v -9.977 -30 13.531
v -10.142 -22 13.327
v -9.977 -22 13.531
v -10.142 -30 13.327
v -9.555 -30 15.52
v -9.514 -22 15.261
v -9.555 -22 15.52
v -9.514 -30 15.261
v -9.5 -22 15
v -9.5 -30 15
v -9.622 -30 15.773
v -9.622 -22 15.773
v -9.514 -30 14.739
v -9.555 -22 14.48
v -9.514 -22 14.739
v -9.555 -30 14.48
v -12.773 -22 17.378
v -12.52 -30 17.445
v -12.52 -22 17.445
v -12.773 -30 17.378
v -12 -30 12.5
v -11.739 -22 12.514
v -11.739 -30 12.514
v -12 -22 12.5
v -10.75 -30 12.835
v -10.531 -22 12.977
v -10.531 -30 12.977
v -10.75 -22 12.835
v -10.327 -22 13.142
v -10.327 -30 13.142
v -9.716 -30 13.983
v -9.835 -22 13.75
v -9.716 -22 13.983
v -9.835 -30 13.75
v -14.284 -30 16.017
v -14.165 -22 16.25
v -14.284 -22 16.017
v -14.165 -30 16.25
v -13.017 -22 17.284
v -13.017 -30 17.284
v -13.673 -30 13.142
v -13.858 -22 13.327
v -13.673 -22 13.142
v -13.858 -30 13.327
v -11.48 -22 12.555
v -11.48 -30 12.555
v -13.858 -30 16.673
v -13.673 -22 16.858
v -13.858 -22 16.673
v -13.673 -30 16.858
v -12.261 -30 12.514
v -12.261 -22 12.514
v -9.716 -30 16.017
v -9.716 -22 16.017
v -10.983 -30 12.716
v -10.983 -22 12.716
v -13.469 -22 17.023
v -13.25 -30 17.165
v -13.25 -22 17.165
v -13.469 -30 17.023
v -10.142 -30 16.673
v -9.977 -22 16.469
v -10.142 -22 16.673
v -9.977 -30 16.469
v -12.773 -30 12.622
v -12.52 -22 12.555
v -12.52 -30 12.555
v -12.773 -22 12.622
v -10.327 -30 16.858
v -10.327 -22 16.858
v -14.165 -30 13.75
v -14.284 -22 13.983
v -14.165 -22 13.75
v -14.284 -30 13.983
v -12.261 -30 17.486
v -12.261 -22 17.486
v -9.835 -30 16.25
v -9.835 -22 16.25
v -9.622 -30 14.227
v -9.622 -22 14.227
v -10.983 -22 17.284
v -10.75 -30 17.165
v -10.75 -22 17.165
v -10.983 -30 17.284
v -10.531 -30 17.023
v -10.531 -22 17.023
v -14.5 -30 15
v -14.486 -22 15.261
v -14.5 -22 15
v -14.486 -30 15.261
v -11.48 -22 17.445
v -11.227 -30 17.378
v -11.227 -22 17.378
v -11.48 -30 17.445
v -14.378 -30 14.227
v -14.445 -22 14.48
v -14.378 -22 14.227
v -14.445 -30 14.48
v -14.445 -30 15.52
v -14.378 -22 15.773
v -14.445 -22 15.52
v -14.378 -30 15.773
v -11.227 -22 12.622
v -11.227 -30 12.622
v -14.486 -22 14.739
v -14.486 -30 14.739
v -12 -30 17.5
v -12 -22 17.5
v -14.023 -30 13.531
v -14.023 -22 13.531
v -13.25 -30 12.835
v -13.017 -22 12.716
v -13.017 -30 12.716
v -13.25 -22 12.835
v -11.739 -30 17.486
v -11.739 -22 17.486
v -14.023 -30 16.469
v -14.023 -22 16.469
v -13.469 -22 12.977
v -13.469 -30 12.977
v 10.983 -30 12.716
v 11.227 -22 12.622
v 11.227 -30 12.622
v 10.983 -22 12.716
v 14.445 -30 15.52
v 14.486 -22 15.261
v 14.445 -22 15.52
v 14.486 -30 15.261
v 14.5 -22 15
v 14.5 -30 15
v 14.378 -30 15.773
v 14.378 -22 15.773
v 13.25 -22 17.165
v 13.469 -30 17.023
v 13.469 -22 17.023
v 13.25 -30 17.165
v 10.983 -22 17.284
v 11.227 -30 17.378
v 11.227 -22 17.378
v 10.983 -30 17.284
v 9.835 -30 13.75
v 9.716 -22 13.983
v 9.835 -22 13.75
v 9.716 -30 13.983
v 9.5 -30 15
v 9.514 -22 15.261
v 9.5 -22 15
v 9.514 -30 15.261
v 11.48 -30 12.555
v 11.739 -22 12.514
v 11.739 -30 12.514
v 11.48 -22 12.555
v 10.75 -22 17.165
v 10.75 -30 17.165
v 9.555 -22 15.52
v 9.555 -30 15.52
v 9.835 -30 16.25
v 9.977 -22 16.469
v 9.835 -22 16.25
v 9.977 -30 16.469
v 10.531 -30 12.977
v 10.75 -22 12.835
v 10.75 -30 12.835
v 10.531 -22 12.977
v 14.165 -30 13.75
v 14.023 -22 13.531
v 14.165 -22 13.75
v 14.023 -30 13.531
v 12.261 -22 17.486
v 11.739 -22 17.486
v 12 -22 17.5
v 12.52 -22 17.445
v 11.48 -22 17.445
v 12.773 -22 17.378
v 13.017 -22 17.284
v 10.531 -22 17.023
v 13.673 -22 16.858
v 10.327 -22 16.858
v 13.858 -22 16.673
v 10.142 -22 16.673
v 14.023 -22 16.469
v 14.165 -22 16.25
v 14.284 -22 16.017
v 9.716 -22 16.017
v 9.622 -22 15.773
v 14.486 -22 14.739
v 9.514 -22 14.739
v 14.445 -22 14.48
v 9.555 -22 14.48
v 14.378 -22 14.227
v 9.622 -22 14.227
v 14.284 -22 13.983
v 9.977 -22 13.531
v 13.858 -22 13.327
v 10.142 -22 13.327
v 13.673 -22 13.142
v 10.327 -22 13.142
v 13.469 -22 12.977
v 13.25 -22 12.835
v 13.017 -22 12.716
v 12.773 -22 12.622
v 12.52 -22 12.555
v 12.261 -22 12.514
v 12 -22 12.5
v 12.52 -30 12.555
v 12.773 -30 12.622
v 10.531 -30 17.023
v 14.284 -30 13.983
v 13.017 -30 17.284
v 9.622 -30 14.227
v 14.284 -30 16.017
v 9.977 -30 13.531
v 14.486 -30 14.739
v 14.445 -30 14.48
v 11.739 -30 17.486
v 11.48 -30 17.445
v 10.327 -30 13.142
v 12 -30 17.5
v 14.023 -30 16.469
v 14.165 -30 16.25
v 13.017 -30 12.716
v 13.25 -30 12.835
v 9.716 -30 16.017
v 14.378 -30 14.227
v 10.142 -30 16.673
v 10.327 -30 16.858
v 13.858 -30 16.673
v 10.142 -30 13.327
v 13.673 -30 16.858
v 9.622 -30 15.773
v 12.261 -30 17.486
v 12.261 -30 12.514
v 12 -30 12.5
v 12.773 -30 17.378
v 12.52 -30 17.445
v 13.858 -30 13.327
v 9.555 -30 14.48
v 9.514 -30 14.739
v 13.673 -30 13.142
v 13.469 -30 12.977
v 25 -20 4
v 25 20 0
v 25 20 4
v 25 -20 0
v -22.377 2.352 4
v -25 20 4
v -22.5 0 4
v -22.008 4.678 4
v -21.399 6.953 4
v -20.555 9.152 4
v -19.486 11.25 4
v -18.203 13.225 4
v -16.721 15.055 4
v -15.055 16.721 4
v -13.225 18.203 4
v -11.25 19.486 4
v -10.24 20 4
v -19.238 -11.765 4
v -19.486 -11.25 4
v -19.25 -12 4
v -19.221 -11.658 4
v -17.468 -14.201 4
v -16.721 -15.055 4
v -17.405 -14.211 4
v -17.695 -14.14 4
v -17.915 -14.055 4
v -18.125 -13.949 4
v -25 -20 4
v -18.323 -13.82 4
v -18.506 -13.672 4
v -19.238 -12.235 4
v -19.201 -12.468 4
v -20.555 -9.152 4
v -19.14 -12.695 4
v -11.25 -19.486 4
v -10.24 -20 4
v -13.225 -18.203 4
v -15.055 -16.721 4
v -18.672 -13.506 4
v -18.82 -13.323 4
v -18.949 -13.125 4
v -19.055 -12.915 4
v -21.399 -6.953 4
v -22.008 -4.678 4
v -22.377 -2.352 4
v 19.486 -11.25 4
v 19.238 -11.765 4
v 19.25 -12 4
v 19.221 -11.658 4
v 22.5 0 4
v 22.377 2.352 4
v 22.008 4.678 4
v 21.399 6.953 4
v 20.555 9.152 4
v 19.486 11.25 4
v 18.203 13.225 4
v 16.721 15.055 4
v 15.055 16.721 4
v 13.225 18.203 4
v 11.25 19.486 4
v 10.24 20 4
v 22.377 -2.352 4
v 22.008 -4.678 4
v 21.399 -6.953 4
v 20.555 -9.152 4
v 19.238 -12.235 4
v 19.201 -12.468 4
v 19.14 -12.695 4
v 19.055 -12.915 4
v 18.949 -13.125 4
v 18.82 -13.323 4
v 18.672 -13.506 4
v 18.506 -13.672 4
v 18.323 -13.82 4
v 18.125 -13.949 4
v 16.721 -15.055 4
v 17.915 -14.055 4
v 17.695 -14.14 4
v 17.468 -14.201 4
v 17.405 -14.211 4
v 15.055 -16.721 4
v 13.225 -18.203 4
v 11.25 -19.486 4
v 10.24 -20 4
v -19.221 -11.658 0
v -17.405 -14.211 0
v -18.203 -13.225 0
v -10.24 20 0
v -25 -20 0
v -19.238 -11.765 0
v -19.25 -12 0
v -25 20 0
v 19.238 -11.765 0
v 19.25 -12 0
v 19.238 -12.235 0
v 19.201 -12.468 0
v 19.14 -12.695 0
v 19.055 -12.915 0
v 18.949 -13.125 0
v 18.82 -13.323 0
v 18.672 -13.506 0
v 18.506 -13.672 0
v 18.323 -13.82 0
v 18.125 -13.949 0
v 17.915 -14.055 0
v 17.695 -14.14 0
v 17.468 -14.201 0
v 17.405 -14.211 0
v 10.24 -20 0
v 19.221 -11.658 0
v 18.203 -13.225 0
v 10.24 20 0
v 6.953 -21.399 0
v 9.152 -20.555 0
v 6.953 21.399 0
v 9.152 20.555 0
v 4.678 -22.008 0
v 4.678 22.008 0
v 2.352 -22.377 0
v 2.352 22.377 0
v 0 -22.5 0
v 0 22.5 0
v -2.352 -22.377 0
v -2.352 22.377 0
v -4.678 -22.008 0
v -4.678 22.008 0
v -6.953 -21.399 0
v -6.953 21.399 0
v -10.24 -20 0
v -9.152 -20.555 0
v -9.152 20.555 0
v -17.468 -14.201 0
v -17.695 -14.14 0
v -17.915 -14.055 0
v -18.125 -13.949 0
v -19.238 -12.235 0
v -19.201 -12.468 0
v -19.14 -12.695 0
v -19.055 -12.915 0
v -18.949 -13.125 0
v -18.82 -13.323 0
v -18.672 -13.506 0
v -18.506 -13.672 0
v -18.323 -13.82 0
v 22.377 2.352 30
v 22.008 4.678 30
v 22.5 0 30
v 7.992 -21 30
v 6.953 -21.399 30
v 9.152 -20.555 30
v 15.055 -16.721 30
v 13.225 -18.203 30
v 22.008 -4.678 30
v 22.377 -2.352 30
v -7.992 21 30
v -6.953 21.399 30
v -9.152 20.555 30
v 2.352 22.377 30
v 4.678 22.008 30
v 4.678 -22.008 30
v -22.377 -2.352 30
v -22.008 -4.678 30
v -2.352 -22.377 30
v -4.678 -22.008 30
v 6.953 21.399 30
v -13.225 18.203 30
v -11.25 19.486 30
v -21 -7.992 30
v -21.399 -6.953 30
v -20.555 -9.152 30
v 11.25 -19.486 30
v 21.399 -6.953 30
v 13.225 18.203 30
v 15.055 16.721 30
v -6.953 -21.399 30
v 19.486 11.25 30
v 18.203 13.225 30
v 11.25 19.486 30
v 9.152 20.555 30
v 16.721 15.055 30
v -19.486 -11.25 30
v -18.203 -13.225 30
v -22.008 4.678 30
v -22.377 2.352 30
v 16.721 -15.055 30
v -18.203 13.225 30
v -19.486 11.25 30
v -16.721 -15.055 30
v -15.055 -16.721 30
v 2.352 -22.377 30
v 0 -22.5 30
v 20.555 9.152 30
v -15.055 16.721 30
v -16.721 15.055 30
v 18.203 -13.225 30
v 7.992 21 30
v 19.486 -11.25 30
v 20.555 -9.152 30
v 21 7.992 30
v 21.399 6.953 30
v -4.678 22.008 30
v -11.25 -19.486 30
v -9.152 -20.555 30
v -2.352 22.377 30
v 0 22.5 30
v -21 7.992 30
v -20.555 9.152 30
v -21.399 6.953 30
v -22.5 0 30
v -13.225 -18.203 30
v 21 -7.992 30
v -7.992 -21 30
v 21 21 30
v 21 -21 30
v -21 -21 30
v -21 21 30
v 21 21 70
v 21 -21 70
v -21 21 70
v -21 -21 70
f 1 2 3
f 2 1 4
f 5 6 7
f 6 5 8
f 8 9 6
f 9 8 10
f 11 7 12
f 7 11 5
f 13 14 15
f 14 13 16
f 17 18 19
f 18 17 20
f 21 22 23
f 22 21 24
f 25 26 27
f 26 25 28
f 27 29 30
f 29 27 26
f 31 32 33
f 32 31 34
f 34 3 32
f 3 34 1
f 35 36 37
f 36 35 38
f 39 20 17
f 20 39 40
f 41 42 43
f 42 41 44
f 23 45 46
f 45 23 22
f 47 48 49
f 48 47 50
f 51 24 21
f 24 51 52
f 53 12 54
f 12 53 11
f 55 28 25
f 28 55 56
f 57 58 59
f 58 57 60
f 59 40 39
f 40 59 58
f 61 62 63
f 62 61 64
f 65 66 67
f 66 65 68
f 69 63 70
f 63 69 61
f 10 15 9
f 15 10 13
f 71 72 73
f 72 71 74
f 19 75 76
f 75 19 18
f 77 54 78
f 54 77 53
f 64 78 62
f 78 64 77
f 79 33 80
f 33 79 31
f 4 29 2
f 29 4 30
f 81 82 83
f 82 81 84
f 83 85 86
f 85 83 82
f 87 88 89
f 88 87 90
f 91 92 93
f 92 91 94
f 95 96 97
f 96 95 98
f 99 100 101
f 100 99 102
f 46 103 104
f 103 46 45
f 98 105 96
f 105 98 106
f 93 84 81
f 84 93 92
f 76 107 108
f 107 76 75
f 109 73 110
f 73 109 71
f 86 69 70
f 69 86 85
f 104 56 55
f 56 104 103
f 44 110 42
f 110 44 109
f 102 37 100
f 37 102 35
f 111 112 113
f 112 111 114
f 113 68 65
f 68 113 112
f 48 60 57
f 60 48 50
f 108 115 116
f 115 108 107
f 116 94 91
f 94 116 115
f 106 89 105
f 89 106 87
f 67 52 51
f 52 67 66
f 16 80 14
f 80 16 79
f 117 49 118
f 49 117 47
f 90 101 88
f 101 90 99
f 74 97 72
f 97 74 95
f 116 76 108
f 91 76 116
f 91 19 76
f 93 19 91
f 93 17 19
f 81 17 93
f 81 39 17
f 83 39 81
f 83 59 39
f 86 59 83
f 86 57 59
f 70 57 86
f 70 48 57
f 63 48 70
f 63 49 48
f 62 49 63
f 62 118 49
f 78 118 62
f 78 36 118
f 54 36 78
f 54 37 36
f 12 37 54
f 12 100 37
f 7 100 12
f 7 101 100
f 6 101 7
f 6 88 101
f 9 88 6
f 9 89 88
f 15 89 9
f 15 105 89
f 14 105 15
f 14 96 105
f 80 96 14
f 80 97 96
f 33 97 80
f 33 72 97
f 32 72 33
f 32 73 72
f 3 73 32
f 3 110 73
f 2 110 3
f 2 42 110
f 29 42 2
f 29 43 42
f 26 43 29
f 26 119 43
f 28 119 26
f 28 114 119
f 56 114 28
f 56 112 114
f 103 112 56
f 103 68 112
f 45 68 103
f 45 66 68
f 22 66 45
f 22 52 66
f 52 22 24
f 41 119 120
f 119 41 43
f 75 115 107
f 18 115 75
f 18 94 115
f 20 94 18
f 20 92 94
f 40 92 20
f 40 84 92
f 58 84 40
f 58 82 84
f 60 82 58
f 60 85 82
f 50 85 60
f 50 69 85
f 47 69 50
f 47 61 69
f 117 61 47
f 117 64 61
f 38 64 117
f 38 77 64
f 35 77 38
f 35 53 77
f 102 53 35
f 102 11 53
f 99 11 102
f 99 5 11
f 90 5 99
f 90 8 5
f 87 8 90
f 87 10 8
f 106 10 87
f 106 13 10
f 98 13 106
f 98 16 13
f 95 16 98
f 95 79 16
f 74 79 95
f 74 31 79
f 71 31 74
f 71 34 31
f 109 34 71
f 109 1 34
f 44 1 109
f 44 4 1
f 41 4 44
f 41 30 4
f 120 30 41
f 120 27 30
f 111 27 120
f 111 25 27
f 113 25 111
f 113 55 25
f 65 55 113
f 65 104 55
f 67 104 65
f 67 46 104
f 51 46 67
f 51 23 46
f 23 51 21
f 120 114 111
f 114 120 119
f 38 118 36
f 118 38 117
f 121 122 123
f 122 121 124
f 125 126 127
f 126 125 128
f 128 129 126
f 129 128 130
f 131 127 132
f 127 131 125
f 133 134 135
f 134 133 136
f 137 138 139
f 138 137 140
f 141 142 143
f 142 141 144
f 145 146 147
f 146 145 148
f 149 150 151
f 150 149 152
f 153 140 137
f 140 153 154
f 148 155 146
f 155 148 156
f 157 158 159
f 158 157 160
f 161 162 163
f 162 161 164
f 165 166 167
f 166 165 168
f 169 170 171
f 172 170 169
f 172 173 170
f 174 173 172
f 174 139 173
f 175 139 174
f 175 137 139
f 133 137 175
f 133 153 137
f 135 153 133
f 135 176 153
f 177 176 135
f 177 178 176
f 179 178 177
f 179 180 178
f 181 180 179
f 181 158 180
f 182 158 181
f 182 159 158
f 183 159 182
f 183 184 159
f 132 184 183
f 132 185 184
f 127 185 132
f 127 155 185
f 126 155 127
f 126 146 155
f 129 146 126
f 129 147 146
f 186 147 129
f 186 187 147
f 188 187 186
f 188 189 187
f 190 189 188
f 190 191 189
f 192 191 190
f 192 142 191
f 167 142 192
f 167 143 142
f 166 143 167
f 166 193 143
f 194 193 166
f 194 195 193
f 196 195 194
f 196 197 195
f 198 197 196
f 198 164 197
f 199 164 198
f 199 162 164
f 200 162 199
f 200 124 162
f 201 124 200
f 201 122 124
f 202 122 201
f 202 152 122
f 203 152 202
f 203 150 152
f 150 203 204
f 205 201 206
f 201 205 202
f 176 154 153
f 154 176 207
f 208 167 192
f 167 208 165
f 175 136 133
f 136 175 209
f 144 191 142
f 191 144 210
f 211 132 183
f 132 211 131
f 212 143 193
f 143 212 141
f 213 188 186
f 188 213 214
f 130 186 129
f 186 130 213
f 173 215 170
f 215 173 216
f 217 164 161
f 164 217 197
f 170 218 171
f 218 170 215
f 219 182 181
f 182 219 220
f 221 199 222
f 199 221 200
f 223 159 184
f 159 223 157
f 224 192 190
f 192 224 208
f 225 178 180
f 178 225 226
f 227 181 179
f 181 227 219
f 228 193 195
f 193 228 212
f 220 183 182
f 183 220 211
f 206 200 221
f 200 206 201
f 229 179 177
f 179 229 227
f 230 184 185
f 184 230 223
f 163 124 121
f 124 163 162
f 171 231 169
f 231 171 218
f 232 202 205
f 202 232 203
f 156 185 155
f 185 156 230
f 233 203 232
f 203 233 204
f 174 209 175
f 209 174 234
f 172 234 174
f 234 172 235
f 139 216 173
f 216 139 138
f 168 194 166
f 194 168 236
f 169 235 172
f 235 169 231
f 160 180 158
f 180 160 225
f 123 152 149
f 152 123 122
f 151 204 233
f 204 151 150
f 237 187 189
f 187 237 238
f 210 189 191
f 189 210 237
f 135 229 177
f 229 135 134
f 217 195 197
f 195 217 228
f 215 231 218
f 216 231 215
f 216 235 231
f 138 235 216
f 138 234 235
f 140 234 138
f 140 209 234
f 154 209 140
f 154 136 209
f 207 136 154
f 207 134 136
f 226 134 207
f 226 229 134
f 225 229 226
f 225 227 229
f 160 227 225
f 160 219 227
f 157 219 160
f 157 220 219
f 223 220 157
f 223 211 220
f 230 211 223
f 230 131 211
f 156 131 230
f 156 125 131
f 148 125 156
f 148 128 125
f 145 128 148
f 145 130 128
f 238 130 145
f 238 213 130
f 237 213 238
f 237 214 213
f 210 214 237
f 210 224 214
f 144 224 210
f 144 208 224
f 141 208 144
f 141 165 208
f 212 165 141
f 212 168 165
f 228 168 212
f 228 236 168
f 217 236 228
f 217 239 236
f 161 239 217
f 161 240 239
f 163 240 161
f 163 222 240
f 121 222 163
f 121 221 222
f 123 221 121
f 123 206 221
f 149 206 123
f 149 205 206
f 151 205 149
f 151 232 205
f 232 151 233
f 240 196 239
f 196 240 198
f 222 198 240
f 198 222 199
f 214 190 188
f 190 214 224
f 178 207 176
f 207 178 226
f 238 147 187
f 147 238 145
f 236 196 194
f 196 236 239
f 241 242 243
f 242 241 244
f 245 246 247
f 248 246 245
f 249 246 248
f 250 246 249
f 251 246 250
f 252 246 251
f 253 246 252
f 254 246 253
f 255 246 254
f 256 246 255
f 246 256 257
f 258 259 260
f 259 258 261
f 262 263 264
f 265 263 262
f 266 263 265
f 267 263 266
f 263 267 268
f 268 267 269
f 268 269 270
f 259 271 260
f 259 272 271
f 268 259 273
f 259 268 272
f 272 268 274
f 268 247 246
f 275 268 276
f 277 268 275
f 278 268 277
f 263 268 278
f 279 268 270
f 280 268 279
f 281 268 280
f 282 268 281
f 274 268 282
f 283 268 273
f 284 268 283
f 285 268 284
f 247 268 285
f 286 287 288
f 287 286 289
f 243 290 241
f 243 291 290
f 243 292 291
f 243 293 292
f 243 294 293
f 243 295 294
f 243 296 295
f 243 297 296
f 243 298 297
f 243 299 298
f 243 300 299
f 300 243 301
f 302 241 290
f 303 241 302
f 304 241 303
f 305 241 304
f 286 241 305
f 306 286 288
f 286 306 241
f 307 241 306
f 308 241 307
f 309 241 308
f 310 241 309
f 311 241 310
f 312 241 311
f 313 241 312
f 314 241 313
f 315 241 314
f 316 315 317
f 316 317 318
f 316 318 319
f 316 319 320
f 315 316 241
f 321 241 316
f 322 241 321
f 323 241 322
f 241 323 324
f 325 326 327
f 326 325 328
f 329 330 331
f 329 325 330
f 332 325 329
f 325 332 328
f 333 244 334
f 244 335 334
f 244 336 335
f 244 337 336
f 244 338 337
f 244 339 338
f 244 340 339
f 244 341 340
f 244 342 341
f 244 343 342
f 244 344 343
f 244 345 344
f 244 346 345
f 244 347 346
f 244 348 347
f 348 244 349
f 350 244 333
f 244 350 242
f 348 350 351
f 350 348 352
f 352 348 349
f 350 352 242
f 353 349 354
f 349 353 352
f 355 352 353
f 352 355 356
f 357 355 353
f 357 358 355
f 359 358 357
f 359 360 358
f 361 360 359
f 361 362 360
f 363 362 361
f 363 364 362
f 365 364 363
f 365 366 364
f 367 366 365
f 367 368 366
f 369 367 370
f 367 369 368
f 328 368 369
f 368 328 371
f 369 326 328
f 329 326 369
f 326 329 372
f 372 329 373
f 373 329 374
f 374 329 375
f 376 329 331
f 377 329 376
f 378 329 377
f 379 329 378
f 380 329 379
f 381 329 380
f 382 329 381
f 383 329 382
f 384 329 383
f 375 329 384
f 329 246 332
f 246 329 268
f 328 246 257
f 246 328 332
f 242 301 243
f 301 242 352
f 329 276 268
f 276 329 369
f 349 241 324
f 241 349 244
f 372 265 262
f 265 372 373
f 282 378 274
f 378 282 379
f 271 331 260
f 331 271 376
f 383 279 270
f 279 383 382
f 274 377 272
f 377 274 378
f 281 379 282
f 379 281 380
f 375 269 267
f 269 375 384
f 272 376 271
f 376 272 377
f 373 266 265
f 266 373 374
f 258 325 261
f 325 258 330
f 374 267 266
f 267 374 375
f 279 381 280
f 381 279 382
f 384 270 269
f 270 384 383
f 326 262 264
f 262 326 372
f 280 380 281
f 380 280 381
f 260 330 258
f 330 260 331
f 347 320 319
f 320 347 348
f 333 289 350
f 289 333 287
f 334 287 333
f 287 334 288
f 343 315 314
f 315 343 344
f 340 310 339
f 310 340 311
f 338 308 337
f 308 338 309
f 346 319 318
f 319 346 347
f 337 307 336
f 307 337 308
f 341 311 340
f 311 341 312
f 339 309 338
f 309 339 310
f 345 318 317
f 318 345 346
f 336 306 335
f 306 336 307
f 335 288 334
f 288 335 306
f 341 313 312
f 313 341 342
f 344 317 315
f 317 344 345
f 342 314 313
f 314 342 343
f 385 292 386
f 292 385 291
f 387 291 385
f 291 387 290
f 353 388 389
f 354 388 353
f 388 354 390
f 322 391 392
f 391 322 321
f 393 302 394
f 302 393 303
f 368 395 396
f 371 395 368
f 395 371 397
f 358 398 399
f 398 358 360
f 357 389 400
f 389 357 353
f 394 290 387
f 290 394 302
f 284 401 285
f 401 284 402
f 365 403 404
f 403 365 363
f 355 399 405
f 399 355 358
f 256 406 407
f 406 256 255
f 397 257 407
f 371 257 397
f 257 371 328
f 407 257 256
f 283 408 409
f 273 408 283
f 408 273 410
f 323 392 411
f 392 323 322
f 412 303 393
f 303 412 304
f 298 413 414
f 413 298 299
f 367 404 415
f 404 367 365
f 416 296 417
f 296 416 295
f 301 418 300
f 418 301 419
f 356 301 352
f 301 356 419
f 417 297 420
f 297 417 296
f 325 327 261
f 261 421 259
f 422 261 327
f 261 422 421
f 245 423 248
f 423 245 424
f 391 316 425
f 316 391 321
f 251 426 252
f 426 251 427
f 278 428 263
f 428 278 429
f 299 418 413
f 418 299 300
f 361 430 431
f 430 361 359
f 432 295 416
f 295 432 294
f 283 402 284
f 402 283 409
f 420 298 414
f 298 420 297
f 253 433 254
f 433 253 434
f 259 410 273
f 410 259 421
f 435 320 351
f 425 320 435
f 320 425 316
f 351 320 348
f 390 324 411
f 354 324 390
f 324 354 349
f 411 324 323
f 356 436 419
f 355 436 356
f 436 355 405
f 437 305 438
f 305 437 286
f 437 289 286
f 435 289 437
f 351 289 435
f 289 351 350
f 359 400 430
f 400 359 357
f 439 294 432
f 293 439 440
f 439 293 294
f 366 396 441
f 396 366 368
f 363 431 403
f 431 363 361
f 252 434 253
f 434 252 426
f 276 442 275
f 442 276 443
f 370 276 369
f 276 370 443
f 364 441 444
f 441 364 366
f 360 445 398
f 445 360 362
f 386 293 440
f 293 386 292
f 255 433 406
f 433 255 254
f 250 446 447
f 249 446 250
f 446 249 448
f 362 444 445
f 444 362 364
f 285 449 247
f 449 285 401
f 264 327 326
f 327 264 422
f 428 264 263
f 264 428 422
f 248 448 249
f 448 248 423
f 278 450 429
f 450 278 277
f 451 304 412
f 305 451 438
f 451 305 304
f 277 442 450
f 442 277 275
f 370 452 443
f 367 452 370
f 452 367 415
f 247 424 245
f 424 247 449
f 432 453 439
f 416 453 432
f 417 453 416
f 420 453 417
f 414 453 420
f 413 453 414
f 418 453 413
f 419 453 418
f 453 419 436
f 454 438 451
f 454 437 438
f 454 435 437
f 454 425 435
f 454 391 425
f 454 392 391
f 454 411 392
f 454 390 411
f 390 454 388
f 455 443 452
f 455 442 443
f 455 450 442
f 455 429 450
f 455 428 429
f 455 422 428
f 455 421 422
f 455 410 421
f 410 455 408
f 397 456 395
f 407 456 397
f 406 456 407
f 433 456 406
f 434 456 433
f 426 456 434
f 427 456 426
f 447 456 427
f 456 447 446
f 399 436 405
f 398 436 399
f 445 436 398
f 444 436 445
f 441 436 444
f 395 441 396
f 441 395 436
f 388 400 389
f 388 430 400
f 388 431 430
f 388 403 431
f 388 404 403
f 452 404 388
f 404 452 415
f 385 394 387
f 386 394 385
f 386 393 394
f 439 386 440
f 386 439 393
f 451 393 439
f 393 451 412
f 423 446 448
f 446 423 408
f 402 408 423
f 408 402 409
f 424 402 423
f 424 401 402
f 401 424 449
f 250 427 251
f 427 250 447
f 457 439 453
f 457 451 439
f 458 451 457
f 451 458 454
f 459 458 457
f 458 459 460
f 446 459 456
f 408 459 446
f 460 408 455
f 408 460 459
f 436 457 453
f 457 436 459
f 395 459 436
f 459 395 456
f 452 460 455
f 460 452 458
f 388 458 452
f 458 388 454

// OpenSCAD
// file: _params.scad
// =========================================================================
// 공유 파라미터 (모든 개별 부품 파일에서 include)
// 메인 어셈블리: cup_z_x_catrage_frame_water_mic_anti_3030.scad 에서 추출
// 프레임: 600 × 420 × 700mm (3030 프로파일, Y=0 대칭)
// =========================================================================

$fn = 60;  // 부품 출력용 고해상도
GLOBAL_TOLERANCE = 0.2;

// --- [1] 하부 기성품 및 원통 파라미터 ---
X_RAIL_LEN = 290.0;
X_BLOCK_W = 30.0; X_BLOCK_L = 32.0;   // 신규 X슬라이더 블록 (폭 30mm × 길이 32mm)
X_PITCH_X = 20.0; X_PITCH_Y = 20.0;   // 체결 홀 피치 (20 × 20mm, M3 나사탭 4개)
X_RAIL_W = 30.0;  X_RAIL_H = 20.0;   // 레일 폭 30mm (레일 바닥~블록 윗면 높이 29mm 반영)
X_TOTAL_H = 29.0;                    // 레일 바닥에서 슬라이더 블록 윗면까지의 높이

MOTOR_W = 42.0;      MOTOR_PITCH = 31.0; MOTOR_HOLE_D = 3.5;    
MOTOR_BOSS_D = 22.0; MOTOR_BOSS_H = 2.0; SCREW_D = 8.0;         
MOT_BODY_L = 41.0;   SHAFT_L = 24.0;     // 실측 NEMA17 몸통 41mm / 축 돌출 24mm

CUP_ID = 99.5;  CUP_WALL = 5.0; CUP_OD = 110.0;     // 아크릴 원통 OD110/ID100
CUP_H = 180.0;   CAGE_H = 60.0;  FLOOR_H = 10.0; PISTON_H = 20.0;     

LIP_D = 30.0;    LIP_H = 5.0;    LEAK_DRAIN_D = 4.0;    
GUIDE_PIPE_D = 8.0; BUSHING_OD = 12.0; BUSHING_H = 8.0;       
DRAIN_RADIUS = 35.0; DRAIN_D = 8.0;        

Y_OFFSET = 85.0; BRKT_H = 12.0; BRKT_D = 122.0; BRKT_ID = 62.0; Z_MOUNT_PCD = 86.0;   

// --- [2] 아크릴 파이프 및 상부 카트리지 ---
ACRYL_ID = 100.0; ACRYL_T = 5.0; ACRYL_OD = ACRYL_ID + (ACRYL_T * 2);  // OD110 (아크릴집 106 재고없음 → 컵과 동일 규격)

REVOLVER_PCD = 240.0;     // 인접 카트리지 웹 9.8mm 확보 (OD110 대응, 230→240)
CARTRIDGE_OD = REVOLVER_PCD + ACRYL_OD + 8; 
TOP_PLATE_H = 15.0;       // 아크릴 15T 통판 (보스홀 단 깊이 10mm)

HUB_D = 60.0;            
SHAFT_D = 12.0;          
HUB_WALL = 4.0;          
HUB_H = 15.0;             // 아크릴 5T × 3장 적층 — 파이프 130mm 대응
POCKET_DEPTH = 5.0;
MID_HUB_Z = 63.5;          // 중단 허브 하면 Z (벨트 중심 Z=71.0mm 정렬, 풀리 상단 Z=75.0mm = 축상단-1mm)
UPPER_HUB_Z = 135.0;       // 상단 허브 하면 Z (전체 135+15=150 유지)
BOSS_OD = 35.0;
BOSS_H = 11.0;             // 보스11 + 와셔1 = 12, 리세스10 → 허브 2mm 공중

// --- [3] GT2 벨트 구동 시스템 ---
GT2_PITCH     = 2.0;
GT2_BELT_W    = 6.0;
BIG_PULLEY_TEETH = 566;
BIG_PULLEY_PD = BIG_PULLEY_TEETH * GT2_PITCH / PI;
BIG_PULLEY_OD = BIG_PULLEY_PD + 1.0;
SMALL_PULLEY_TEETH = 20;
SMALL_PULLEY_PD = SMALL_PULLEY_TEETH * GT2_PITCH / PI;
SMALL_PULLEY_OD = SMALL_PULLEY_PD + 1.0;

BELT_MOTOR_X = -300;
BELT_MOTOR_Y = -155.5;
BRKT_MOTOR_H = 25.0;
BRKT_MOTOR_W = 45.0;        // 브래킷 폭 45mm (프로파일 간섭 회피 복원)
SLOT_LEN = 10.0;
FLAG_W = 15.0;  FLAG_H = 8.0;  FLAG_T = 1.5;

X_POS_MEASURE = 170.0;   // 측정 브래킷 X좌표 (X_M~X_R 정중앙, X대칭)

// --- [4] 3030 프레임 경계 (600×430×700mm) ---
PF = 30;             // 3030 알루미늄 프로파일
WASHER_T = 1.0;     

X_L = -320;
X_M = 60;
X_R = 250;
Y_F = -210;          // 전방 (대칭: -210+30=-180, Y=0 중심)
Y_B = 180;           // 후방 (대칭: 180+30=210, Y=0 중심) — 메인파일과 동기화

Z_BOT = -480;
Z_RAIL = -322;
Z_MID = -TOP_PLATE_H - PF;
Z_TOP = 220;

SUPPORT_PILLAR_H = Z_TOP - PF;

SHAFT_SQ = 20;       // 2020 사각 회전축

// 사각 축 홀 크기
SQ = SHAFT_SQ + GLOBAL_TOLERANCE;  // 20.2mm

// --- 리볼버/컵 축 정렬 (보스홀=판 중심에 리볼버 정렬) ---
REVOLVER_CX = (X_L + X_M + PF)/2;        // 판 중심 = 보스홀 = 리볼버 회전축 (-115)
DROP_X      = REVOLVER_CX + REVOLVER_PCD/2;  // 링 드롭 / 컵 적재 축 (+5)

FLANGE_Z = 52.0;       // 모터 전면 안착 높이 (Z=52mm -> 축 상단 Z=76mm, 풀리 결합)

// --- [5] 모터 체결홀 (이미 제작 완료된 15T 상판 원본 도면 수치 100% 유지) ---
MOTOR_BOLT_PITCH     = 25.0;      // Y피치 (Y = ±12.5mm)
MOTOR_BOLT_X_NOMINAL = X_L + 55;  // 1열: 상판 좌단 55 (모터축 기준 +35mm = X=-265mm)
MOTOR_BOLT_X_SHIFT   = X_L + 40;  // 2열: 상판 좌단 40 (모터축 기준 +20mm = X=-280mm)

// 모터 마운트 볼트 카운터보어 (단볼트용 — 브래킷 두께 25 중 깊게 파냄)
MOTOR_CB_D     = 6.5;            // M3 캡볼트 머리 클리어런스
MOTOR_CB_DEPTH = 19;             // 카운터보어 깊이 (잔여 통과 6mm → M3×10 단볼트)
// main file
// =========================================================================
// [구매] 스텝모터 구동 연동 펌프 (Peristaltic Pump, 정량 급수용)
// 메인 파일 fluidic_control_system_assembly() 펌프 부분 복사
// =========================================================================
include <_params.scad>

// 펌프 헤드 (청색 반투명)
color([0.2, 0.7, 0.9]) cylinder(d=45, h=30);
// 모터 본체 (사각)
color([0.15, 0.15, 0.15]) translate([-21, -21, 30]) cube([42, 42, 40]); 
// 입출구 니플
color([0.6, 0.6, 0.6]) { 
    translate([-12, -22, 15]) rotate([90, 0, 0]) cylinder(d=5, h=8); 
    translate([12, -22, 15]) rotate([90, 0, 0]) cylinder(d=5, h=8); 
}
// 마운트 브래킷
color([0.5, 0.5, 0.5]) translate([-25, -20, 0]) { 
    difference() { 
        cube([50, 40, 4]); 
        translate([8, 8, -1]) cylinder(d=4.5, h=6); 
        translate([42, 8, -1]) cylinder(d=4.5, h=6); 
    } 
}
